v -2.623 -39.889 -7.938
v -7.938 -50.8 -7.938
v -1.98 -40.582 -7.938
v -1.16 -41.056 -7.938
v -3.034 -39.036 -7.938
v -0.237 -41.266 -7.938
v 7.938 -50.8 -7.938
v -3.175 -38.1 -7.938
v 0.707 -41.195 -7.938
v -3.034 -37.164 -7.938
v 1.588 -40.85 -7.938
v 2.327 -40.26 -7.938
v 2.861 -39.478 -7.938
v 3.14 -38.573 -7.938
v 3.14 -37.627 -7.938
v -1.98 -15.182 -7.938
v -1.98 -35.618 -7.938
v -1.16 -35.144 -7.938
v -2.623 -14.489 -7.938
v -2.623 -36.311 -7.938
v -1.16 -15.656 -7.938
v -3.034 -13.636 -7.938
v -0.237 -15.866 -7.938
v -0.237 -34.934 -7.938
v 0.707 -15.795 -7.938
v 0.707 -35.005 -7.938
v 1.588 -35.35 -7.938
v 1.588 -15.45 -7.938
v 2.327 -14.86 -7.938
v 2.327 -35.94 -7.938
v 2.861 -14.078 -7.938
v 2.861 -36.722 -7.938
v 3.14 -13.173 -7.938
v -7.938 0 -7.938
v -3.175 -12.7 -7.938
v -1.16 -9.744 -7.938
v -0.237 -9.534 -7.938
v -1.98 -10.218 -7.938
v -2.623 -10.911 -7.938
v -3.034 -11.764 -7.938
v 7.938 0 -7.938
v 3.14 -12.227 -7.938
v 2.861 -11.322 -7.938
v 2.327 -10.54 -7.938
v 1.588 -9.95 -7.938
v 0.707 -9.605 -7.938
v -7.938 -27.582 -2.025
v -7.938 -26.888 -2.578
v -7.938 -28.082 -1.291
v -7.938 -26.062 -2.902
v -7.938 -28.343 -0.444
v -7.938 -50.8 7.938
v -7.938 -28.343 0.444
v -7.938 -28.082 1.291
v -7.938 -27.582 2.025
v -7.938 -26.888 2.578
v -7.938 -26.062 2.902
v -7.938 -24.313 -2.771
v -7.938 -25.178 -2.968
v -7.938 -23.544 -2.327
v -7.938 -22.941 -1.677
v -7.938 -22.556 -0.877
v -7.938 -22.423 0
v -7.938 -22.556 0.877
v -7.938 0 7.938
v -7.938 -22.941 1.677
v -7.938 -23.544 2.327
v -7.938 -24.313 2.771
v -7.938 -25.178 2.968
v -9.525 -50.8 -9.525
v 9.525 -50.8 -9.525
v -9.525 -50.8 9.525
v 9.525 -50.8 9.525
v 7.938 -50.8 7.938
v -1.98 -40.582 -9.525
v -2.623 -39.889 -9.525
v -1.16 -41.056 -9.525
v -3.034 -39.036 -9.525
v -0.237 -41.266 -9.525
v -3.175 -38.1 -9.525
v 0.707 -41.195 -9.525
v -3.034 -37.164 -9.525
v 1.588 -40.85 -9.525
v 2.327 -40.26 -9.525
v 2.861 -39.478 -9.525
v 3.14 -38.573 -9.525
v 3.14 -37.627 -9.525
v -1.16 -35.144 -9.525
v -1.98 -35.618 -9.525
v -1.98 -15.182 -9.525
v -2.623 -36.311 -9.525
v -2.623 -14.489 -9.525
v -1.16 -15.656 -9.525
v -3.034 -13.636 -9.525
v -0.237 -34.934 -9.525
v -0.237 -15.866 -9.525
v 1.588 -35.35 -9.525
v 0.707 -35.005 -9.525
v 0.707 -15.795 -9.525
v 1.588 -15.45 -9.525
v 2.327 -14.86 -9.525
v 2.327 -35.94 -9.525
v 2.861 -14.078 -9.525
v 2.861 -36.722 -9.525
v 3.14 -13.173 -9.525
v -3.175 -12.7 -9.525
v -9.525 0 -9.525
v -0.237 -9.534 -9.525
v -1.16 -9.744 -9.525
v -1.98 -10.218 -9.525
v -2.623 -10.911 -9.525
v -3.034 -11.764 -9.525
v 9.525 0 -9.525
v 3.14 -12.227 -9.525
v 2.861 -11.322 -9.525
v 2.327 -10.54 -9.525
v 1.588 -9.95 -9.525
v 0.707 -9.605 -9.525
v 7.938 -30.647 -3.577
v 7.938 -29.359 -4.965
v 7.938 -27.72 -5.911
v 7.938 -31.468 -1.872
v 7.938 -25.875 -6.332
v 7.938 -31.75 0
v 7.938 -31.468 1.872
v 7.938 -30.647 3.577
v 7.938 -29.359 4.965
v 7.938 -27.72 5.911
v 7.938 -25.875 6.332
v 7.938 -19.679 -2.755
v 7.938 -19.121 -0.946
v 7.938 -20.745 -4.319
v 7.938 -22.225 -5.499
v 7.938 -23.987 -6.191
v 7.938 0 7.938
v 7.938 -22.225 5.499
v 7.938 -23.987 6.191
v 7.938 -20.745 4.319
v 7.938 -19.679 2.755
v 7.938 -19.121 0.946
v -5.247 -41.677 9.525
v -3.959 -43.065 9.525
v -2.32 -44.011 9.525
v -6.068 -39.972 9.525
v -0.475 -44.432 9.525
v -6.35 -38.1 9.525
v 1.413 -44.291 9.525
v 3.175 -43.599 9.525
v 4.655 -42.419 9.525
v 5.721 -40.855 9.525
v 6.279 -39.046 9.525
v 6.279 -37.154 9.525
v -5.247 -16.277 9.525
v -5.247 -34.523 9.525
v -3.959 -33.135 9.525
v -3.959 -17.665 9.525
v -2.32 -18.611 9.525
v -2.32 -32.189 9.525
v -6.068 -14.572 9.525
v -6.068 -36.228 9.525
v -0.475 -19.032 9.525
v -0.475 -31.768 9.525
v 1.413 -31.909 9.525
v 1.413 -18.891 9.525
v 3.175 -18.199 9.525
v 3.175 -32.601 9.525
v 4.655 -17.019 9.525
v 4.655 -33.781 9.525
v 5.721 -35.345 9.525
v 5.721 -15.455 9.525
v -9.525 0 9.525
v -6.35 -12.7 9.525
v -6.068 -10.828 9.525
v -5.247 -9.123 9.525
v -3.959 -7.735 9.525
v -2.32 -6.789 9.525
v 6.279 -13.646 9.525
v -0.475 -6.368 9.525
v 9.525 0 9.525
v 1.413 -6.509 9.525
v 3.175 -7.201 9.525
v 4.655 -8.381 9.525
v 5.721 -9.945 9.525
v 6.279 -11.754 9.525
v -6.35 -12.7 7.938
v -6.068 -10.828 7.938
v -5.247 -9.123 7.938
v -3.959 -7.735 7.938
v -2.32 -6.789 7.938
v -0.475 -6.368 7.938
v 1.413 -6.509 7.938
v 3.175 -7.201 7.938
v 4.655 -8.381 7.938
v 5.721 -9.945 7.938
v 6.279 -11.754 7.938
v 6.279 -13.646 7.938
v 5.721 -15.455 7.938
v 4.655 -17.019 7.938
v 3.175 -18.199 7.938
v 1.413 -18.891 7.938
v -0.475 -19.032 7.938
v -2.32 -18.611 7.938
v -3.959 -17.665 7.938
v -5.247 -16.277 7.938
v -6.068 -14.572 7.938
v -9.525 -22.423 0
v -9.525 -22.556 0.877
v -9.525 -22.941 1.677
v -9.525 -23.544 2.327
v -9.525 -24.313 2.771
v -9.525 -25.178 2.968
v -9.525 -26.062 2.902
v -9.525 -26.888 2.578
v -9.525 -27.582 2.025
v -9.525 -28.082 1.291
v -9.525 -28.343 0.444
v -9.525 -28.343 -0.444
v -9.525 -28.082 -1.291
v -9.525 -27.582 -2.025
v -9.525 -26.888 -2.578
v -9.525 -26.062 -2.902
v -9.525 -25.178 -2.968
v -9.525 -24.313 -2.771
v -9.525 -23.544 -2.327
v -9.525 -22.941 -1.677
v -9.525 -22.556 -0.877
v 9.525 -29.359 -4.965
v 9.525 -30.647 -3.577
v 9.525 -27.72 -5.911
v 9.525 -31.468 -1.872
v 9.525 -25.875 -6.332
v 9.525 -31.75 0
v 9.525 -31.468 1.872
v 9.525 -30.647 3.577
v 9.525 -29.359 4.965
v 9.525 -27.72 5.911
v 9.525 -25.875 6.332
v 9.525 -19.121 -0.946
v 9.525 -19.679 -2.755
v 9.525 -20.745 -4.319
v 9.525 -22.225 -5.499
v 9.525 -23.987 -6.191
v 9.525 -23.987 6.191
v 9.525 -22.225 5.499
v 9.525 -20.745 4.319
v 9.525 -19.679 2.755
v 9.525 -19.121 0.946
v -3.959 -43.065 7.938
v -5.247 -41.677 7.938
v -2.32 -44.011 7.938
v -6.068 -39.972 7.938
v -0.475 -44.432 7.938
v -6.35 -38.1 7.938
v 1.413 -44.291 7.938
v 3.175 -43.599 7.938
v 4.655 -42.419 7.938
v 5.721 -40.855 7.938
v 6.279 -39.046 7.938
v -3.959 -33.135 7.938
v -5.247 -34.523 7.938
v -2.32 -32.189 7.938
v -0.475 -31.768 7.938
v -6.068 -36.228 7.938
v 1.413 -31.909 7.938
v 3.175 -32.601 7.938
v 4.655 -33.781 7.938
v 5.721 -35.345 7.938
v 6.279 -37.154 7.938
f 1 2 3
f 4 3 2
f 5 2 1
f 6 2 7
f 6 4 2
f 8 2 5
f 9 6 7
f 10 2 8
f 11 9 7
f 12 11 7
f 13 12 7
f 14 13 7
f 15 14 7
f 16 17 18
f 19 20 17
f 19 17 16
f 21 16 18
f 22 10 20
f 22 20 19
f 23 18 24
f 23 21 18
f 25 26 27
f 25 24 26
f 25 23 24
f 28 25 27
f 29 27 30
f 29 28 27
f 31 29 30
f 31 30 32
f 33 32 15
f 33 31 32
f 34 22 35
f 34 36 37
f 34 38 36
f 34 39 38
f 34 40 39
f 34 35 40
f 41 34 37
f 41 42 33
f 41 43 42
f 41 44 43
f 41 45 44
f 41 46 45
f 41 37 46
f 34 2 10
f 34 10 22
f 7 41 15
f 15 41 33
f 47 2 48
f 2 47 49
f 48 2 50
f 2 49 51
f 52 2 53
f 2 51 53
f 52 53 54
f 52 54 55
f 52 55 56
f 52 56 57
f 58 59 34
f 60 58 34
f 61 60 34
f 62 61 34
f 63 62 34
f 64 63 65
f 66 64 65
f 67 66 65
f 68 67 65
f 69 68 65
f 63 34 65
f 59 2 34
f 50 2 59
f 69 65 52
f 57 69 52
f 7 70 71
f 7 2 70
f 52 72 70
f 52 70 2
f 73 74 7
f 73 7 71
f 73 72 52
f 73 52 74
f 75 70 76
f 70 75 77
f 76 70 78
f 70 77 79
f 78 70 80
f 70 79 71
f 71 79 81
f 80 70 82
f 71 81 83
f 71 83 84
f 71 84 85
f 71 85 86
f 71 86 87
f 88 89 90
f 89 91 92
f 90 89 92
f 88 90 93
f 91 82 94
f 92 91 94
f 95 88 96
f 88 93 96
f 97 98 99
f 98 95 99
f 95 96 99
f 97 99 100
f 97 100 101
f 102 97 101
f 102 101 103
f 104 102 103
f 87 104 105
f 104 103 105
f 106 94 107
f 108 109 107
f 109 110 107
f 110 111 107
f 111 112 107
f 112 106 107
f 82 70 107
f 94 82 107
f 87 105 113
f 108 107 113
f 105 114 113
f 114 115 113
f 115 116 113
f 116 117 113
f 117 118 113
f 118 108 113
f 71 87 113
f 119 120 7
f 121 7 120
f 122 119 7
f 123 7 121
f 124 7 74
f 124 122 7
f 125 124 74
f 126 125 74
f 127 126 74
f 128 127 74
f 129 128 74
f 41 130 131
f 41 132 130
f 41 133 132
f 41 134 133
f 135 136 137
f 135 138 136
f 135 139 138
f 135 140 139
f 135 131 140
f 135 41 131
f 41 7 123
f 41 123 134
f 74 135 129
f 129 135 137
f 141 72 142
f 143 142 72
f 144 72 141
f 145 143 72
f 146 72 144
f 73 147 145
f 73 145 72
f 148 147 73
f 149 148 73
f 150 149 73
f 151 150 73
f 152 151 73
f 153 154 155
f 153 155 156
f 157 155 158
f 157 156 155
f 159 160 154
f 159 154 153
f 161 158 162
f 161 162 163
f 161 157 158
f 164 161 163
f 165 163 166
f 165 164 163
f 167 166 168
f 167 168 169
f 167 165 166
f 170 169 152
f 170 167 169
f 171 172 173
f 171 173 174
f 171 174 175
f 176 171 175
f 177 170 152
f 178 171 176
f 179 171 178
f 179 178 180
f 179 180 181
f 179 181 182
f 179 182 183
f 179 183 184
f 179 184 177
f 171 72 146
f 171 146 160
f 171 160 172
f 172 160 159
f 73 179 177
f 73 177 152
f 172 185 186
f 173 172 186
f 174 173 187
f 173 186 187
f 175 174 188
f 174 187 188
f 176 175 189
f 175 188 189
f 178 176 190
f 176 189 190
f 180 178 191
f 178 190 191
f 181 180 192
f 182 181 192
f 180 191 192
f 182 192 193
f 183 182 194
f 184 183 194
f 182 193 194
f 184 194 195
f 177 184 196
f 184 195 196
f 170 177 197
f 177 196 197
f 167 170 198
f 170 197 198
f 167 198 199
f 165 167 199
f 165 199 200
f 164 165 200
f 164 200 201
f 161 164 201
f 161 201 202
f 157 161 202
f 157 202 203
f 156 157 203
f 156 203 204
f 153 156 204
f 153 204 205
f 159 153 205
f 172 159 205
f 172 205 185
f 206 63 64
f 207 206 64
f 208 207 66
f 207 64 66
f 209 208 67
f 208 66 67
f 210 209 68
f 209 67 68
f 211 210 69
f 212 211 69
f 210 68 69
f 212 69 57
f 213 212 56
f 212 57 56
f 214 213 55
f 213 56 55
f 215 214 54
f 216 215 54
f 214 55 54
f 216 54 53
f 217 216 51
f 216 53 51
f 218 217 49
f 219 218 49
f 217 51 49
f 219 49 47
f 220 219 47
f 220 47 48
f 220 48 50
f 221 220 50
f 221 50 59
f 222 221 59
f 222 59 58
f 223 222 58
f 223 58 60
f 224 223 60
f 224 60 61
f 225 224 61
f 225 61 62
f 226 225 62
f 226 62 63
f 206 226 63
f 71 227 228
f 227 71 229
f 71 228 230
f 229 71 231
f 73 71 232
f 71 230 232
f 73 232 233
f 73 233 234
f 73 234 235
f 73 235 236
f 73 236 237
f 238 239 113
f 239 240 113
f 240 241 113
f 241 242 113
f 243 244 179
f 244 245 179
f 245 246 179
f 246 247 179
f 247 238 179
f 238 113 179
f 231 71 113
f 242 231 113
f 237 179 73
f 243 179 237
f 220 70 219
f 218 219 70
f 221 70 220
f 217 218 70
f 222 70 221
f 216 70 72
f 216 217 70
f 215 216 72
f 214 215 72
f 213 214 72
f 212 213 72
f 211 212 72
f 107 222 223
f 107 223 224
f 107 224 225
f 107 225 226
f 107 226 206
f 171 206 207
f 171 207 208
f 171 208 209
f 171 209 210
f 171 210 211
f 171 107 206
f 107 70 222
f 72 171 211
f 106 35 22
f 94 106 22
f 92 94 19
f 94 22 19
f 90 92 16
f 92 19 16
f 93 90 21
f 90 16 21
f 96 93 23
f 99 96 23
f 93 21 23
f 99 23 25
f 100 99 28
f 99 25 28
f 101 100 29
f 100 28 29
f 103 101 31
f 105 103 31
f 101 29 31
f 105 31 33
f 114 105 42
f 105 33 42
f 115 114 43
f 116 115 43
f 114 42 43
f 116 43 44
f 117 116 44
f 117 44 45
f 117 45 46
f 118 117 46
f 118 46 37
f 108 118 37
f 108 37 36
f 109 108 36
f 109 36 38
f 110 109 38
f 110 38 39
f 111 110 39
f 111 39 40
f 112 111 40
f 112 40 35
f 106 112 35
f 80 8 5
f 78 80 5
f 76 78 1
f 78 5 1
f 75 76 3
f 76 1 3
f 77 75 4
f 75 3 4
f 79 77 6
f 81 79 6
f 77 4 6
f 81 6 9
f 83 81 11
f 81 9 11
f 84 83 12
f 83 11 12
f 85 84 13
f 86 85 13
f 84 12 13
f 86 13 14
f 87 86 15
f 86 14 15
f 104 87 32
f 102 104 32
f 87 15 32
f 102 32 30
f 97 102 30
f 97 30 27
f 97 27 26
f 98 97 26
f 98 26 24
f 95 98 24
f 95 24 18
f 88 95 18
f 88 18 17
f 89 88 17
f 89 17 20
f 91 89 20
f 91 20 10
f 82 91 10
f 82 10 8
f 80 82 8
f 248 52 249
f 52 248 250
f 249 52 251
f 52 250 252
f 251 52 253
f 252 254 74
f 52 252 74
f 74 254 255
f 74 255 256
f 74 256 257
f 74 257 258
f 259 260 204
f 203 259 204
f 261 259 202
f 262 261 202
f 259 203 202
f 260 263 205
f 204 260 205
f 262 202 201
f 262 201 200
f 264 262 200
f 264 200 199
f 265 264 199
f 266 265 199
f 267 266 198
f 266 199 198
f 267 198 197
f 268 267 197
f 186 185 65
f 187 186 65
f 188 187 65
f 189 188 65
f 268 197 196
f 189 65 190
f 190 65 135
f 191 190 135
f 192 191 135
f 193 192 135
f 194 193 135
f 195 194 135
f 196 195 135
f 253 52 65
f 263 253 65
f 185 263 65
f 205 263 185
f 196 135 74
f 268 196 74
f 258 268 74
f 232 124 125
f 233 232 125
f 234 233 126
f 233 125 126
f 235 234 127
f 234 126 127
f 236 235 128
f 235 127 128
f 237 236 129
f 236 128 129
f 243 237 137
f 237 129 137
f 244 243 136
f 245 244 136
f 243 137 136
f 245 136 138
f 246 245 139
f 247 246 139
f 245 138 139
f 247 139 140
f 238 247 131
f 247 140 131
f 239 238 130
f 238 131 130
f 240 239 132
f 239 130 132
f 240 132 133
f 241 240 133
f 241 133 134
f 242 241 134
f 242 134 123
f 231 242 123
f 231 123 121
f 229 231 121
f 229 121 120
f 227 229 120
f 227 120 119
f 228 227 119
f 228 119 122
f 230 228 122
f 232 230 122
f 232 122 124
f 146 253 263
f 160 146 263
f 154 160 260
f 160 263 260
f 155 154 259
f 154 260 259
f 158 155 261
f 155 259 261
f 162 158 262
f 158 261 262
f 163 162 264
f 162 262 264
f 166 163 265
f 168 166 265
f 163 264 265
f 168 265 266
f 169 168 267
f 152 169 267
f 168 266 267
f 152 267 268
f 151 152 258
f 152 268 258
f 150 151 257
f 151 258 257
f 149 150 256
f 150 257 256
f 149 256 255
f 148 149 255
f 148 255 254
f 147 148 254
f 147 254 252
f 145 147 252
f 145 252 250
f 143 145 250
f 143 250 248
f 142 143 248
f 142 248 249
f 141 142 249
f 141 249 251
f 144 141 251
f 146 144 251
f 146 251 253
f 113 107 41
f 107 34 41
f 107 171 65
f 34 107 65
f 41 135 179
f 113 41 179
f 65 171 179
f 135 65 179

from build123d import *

# Parameters (mm, degrees)
F0_W     = 19.05
F0_H     = 19.05
F0_W_2   = 15.875
F0_H_2   = 15.875
F1_DEPTH = 50.8
F3_D     = 5.953125
F3_DEPTH = 6.35
F5_D     = 12.7
F5_DEPTH = 6.35
F7_D     = 12.7
F7_DEPTH = 6.35
F9_D     = 6.35
F9_DEPTH = 6.35


with BuildPart() as f1:
    # F0 (on Front) → F1 (new body)
    with BuildSketch(Plane.XZ):
        Rectangle(F0_W, F0_H)
        Rectangle(F0_W_2, F0_H_2, mode=Mode.SUBTRACT)
    extrude(amount=F1_DEPTH)

    # F3
    with Locations(Plane(origin=(-9.525, 0, 0), x_dir=(0, -1, 0), z_dir=(-1, 0, 0))):
        with Locations((25.4, 0)):
            Hole(F3_D / 2, depth=F3_DEPTH)

    # F5
    with Locations(Plane.YZ.offset(9.525)):
        with Locations((-25.4, 0)):
            Hole(F5_D / 2, depth=F5_DEPTH)

    # F7
    with Locations(Plane.XY.offset(9.525)):
        with Locations((0, -12.7), (0, -38.1)):
            Hole(F7_D / 2, depth=F7_DEPTH)

    # F9
    with Locations(Plane(origin=(0, 0, -9.525), x_dir=(1, 0, 0), z_dir=(0, 0, -1))):
        with Locations((0, 12.7), (0, 38.1)):
            Hole(F9_D / 2, depth=F9_DEPTH)


solid = f1.part
